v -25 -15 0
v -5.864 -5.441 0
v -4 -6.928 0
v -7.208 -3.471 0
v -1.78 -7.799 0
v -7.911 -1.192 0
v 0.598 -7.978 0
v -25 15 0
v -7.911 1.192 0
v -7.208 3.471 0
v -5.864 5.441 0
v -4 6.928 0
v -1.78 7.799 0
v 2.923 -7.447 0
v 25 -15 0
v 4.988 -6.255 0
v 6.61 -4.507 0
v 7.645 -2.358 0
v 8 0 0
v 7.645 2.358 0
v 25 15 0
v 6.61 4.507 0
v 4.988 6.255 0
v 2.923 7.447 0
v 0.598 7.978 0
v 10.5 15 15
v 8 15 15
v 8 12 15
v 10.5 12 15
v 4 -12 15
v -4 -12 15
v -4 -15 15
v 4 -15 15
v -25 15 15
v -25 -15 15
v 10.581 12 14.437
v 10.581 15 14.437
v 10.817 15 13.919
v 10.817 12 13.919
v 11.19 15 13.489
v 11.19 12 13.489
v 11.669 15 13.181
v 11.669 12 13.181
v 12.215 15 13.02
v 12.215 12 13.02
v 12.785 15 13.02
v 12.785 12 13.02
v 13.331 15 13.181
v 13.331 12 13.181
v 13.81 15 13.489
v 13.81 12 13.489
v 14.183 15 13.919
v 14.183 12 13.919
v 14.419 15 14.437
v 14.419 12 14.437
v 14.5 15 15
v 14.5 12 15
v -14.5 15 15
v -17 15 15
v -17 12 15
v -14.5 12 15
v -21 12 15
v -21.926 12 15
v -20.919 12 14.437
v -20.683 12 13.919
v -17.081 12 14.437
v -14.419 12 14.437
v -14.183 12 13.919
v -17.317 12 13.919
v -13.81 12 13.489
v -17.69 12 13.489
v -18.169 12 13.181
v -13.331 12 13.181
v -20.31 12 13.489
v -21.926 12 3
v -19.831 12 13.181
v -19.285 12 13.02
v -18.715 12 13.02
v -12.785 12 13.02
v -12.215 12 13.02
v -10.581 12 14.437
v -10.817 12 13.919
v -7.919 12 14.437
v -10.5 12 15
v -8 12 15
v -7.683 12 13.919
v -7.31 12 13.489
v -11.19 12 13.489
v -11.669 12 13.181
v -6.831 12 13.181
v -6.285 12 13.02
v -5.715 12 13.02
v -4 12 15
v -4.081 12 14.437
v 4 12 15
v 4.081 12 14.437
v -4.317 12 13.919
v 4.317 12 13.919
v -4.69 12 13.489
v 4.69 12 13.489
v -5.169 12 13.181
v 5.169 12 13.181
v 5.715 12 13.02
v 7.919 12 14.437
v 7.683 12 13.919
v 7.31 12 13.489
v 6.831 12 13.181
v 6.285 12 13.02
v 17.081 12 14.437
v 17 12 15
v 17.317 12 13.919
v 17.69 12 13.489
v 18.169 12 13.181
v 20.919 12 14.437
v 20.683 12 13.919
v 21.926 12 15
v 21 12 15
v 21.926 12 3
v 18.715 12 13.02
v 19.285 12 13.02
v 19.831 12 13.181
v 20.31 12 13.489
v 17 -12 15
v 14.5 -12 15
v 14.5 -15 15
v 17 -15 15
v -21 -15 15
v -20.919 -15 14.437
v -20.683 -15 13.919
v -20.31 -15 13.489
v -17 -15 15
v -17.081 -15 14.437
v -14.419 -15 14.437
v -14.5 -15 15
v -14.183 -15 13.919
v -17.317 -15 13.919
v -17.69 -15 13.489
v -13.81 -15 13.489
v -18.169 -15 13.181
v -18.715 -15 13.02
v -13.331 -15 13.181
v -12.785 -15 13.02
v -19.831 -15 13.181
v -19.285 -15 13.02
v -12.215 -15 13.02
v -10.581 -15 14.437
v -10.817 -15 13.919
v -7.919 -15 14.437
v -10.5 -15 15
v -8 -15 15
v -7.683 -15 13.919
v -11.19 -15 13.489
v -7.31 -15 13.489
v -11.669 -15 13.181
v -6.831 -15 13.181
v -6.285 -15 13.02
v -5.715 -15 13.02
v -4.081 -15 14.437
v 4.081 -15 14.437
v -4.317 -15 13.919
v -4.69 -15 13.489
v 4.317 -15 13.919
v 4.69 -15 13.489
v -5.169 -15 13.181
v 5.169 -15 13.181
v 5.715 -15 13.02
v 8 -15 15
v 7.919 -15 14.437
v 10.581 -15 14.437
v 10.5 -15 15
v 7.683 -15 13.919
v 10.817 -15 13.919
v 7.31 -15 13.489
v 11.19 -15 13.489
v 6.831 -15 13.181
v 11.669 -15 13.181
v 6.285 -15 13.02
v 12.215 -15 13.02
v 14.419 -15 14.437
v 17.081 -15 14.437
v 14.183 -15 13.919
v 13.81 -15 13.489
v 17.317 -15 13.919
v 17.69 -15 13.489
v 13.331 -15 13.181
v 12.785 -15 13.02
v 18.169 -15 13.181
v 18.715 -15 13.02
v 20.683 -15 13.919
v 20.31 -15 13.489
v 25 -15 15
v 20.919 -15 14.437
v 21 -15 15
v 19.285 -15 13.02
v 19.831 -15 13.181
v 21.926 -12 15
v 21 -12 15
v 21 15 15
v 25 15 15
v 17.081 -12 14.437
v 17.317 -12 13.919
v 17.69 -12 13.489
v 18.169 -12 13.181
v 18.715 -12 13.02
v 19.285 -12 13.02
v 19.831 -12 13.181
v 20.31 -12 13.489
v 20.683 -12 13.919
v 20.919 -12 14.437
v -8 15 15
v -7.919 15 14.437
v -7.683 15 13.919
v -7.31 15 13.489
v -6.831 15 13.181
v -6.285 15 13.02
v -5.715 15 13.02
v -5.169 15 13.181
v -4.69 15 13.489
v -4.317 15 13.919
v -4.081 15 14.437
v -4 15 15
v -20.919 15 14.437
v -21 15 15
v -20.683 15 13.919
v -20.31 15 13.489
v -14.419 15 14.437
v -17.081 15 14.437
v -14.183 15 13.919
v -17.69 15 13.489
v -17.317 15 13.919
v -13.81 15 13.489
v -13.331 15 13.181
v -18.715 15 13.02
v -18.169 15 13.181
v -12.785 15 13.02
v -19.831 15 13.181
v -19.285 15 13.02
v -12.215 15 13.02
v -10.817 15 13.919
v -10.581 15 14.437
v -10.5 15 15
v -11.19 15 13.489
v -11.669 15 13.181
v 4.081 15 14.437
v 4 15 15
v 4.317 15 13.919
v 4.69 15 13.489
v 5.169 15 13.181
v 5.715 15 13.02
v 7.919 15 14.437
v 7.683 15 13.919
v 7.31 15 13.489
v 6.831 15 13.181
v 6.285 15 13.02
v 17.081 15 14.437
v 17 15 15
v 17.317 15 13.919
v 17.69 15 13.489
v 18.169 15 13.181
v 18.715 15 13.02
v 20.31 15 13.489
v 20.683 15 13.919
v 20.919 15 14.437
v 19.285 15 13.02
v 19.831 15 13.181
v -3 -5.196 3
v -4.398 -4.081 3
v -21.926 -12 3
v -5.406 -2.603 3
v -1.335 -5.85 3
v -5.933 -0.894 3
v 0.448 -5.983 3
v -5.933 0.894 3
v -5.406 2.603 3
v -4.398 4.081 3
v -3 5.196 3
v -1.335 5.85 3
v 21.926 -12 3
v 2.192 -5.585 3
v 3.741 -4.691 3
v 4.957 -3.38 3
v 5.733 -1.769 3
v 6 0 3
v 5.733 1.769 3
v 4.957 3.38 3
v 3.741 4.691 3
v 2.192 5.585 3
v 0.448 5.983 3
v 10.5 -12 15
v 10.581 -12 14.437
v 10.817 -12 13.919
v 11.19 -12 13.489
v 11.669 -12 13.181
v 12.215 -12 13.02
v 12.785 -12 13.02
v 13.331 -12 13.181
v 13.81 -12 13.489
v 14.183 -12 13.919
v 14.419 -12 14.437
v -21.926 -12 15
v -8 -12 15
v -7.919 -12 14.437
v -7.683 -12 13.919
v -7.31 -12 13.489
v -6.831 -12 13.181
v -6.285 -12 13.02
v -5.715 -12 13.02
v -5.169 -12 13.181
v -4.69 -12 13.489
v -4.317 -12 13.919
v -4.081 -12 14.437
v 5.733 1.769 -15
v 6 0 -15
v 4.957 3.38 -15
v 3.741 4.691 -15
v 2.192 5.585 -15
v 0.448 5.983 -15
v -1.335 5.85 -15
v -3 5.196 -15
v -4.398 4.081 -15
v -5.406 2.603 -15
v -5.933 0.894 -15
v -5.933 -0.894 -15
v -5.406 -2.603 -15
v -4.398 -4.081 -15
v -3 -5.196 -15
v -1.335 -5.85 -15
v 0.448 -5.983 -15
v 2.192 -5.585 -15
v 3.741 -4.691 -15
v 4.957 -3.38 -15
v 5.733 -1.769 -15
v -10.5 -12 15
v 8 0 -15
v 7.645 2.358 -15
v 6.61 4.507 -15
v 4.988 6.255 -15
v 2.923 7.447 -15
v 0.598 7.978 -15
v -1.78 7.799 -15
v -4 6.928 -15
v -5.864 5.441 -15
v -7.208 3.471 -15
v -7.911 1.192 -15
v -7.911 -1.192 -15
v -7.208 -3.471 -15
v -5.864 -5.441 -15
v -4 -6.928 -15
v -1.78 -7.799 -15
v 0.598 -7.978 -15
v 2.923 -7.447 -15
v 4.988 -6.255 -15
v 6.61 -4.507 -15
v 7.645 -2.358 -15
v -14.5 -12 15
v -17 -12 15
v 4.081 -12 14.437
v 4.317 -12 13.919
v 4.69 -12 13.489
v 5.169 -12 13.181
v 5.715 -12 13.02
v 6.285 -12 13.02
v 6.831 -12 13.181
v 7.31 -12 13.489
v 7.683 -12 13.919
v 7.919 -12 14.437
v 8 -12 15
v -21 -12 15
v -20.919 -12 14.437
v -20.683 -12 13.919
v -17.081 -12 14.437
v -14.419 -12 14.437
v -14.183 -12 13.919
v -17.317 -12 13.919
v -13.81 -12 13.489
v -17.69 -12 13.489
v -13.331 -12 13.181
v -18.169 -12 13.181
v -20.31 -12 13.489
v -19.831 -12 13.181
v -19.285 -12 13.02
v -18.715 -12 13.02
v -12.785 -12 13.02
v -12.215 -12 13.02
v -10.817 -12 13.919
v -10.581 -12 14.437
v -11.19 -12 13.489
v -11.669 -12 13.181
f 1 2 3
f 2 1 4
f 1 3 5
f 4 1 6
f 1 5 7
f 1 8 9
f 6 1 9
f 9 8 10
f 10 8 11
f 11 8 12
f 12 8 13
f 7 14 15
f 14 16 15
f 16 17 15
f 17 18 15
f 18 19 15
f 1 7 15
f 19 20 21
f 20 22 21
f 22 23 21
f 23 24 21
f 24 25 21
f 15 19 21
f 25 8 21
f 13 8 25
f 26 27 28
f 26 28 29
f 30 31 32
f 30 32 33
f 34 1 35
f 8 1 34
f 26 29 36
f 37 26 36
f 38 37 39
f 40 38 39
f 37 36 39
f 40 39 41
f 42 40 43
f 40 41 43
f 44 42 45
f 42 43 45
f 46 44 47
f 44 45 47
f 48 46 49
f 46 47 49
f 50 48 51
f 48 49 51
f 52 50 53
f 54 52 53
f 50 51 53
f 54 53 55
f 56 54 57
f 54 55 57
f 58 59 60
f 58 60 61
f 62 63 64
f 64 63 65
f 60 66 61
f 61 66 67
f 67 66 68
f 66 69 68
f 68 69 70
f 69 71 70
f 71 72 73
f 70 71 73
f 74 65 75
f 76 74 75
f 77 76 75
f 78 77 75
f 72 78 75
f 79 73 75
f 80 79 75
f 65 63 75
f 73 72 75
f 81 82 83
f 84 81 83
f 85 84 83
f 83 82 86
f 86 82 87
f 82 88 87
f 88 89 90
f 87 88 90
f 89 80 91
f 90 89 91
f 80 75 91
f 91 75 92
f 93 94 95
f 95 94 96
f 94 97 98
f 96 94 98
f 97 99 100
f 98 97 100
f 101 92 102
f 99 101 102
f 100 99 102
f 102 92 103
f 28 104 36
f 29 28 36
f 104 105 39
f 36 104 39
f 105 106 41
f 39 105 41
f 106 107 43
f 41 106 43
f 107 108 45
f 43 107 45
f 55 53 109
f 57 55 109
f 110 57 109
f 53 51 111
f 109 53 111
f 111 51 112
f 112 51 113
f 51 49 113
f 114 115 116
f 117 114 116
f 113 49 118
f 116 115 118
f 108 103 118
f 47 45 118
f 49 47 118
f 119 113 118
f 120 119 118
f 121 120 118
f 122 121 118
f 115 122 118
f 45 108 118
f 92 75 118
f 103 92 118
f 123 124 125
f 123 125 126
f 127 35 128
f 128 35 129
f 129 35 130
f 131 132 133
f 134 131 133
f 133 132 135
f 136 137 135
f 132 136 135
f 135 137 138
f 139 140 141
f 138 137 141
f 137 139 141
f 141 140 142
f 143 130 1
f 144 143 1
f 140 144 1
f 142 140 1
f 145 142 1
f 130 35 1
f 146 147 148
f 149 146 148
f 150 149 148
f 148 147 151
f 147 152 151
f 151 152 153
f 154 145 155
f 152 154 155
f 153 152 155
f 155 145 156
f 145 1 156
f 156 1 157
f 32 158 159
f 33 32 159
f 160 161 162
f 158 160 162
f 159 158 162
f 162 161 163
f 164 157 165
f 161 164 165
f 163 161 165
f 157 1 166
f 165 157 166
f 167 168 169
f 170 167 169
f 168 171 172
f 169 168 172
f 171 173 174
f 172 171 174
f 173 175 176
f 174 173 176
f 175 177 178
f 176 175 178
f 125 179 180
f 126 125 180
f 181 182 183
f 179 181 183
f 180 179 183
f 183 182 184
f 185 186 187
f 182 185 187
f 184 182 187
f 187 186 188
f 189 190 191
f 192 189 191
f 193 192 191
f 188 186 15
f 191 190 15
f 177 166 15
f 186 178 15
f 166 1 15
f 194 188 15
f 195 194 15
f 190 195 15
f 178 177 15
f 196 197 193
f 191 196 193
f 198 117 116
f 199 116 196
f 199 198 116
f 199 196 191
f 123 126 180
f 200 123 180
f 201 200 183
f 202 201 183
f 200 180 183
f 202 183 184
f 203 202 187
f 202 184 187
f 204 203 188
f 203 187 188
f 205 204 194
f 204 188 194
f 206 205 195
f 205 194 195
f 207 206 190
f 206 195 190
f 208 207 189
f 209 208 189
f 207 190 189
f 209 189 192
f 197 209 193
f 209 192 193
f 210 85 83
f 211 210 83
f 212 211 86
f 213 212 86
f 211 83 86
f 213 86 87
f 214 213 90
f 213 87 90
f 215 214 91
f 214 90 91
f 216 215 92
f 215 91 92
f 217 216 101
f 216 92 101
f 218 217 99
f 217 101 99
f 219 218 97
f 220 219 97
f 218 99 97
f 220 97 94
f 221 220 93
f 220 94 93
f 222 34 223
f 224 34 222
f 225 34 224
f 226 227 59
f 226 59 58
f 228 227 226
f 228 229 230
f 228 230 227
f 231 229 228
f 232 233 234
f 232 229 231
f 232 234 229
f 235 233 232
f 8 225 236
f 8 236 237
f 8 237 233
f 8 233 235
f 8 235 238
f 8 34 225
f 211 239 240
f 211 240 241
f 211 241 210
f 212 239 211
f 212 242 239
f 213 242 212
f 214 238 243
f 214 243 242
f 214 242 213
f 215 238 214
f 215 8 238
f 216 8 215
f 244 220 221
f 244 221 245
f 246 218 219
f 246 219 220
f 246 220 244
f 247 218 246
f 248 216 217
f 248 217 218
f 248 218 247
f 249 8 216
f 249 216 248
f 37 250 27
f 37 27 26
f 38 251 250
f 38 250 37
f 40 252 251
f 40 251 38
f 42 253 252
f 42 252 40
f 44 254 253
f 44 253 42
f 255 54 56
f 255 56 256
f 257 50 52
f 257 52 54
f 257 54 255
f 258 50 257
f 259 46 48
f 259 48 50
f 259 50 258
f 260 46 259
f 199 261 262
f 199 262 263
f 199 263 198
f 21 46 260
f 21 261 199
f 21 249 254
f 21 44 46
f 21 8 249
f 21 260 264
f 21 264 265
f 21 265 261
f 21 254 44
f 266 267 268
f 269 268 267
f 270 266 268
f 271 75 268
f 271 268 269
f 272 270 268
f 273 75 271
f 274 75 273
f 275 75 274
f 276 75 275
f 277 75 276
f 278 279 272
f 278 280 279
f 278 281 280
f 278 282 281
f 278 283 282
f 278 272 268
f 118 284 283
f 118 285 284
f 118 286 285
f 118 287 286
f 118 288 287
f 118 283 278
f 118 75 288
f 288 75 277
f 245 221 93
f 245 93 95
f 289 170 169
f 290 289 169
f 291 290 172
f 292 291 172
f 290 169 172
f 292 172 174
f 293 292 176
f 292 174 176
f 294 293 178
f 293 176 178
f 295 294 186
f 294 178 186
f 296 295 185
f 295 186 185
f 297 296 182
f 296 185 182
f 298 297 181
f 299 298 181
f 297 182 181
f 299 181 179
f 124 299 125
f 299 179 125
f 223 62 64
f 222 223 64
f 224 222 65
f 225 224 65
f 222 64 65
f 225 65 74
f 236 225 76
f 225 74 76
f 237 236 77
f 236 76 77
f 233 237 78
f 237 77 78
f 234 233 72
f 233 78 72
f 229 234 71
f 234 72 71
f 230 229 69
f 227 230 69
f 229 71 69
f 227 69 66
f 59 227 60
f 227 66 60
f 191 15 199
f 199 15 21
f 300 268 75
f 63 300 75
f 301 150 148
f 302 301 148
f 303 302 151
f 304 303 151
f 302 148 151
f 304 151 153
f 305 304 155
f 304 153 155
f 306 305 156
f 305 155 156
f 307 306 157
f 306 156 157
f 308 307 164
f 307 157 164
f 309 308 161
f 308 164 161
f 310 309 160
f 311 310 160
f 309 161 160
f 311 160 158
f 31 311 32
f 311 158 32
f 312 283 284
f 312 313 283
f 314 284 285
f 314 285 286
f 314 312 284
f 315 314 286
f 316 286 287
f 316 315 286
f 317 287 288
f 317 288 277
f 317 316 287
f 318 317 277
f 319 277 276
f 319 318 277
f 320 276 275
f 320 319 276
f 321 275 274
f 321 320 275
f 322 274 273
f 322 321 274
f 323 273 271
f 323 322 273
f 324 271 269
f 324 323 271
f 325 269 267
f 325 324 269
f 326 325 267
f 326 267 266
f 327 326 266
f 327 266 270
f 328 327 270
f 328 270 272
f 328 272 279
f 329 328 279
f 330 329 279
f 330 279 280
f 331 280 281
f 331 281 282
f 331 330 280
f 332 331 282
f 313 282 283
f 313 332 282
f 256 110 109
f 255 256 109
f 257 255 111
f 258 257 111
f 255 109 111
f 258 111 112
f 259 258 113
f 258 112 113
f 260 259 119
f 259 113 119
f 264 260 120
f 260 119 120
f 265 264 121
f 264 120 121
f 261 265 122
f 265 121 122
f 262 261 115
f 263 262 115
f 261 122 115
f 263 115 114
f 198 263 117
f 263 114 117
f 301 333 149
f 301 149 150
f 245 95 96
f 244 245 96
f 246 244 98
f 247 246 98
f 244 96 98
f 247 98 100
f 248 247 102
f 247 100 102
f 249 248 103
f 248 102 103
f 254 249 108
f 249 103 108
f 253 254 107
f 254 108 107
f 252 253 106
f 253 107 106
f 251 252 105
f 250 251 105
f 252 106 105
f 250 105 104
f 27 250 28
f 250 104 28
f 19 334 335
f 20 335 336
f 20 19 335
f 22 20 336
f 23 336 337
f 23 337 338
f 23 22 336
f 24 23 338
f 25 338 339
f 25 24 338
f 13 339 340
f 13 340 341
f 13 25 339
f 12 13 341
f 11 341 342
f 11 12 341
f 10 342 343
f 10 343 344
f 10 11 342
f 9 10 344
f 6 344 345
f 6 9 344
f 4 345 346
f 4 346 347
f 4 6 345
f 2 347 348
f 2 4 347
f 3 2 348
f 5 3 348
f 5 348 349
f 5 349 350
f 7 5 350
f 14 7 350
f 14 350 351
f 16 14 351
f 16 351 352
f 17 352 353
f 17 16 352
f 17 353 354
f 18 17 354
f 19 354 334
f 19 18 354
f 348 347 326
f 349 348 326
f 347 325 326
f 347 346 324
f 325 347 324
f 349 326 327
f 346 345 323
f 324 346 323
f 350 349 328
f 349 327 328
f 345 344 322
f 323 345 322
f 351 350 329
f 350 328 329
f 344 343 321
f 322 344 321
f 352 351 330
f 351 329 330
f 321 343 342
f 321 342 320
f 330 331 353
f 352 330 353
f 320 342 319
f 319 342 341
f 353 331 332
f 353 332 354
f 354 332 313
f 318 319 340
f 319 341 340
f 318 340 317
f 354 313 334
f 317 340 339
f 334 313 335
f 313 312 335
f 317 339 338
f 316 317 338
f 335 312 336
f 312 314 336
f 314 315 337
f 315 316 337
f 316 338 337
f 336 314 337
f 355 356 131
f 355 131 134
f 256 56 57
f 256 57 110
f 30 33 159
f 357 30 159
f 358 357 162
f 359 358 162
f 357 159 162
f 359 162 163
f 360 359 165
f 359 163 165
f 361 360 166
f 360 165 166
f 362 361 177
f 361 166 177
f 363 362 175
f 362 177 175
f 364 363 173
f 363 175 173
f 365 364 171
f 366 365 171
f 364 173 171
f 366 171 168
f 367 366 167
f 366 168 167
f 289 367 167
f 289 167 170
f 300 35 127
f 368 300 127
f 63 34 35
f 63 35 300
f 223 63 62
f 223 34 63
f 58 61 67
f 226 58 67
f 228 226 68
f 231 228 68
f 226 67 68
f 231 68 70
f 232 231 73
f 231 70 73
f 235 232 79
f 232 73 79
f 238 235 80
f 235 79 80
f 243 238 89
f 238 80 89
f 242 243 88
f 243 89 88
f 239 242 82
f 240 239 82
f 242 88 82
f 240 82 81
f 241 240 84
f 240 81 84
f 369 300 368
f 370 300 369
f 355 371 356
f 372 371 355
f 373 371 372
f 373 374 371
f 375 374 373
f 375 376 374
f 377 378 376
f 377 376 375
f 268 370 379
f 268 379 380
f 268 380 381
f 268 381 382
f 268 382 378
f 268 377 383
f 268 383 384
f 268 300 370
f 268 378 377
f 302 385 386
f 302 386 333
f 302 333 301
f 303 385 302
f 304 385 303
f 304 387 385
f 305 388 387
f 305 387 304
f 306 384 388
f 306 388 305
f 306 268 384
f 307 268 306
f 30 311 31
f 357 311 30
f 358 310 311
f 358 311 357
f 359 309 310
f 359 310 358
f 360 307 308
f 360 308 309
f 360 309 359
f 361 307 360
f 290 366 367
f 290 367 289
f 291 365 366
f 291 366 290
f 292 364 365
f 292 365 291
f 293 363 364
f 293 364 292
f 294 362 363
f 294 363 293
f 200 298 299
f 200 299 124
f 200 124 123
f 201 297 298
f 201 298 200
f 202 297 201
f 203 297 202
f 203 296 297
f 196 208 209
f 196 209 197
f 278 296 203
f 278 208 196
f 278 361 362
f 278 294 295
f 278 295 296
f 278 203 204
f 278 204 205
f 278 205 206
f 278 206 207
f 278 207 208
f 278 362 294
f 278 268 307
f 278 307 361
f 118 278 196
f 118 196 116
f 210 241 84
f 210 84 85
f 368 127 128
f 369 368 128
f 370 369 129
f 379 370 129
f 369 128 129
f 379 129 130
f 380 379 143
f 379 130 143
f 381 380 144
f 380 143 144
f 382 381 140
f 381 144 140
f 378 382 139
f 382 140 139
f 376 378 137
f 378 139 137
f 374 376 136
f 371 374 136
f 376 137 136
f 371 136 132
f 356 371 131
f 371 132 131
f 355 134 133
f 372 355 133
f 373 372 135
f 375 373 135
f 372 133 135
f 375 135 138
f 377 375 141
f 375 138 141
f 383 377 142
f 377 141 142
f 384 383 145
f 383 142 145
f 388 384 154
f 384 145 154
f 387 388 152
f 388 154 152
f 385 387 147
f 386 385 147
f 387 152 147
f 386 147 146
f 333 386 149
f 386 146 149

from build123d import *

# Parameters (mm, degrees)
F0_W          = 50
F0_H          = 30
F0_W_2        = 43.8518549643
F0_H_2        = 24
F1_DEPTH      = 15
F0_R          = 8
F2_DEPTH      = 3
F0_R_2        = 6
F3_DEPTH      = 15
F3_DEPTH_BACK = 3
F5_DEPTH      = 46.6


with BuildPart() as f1:
    # F0 (on Top) → F1 (new body)
    with BuildSketch(Plane.XY):
        Rectangle(F0_W, F0_H)
        Rectangle(F0_W_2, F0_H_2, mode=Mode.SUBTRACT)
    extrude(amount=F1_DEPTH)

    # F0 (on Top) → F2 (join)
    with BuildSketch(Plane.XY):
        Rectangle(F0_W_2, F0_H_2)
        Circle(F0_R, mode=Mode.SUBTRACT)
    extrude(amount=F2_DEPTH)

    # F0 (on Top) → F3 (join, two sides)
    with BuildSketch(Plane.XY) as f3_sk:
        Circle(F0_R)
        Circle(F0_R_2, mode=Mode.SUBTRACT)
    extrude(amount=-F3_DEPTH)
    extrude(f3_sk.sketch, amount=F3_DEPTH_BACK)

    # F4 (on face) → F5 (cut)
    with BuildSketch(Plane.XZ.offset(15)):
        with BuildLine():
            ThreePointArc((-17, 15), (-19, 17), (-21, 15))
            Line((-21, 15), (-17, 15))
        make_face()
        with BuildLine():
            ThreePointArc((21, 15), (19, 17), (17, 15))
            Line((17, 15), (21, 15))
        make_face()
        with BuildLine():
            Line((21, 15), (17, 15))
            ThreePointArc((17, 15), (19, 13), (21, 15))
        make_face()
        with BuildLine():
            ThreePointArc((14.5, 15), (12.5, 17), (10.5, 15))
            Line((10.5, 15), (14.5, 15))
        make_face()
        with BuildLine():
            Line((14.5, 15), (10.5, 15))
            ThreePointArc((10.5, 15), (12.5, 13), (14.5, 15))
        make_face()
        with BuildLine():
            ThreePointArc((8, 15), (6, 17), (4, 15))
            Line((4, 15), (8, 15))
        make_face()
        with BuildLine():
            Line((8, 15), (4, 15))
            ThreePointArc((4, 15), (6, 13), (8, 15))
        make_face()
        with BuildLine():
            ThreePointArc((-4, 15), (-6, 17), (-8, 15))
            Line((-8, 15), (-4, 15))
        make_face()
        with BuildLine():
            Line((-4, 15), (-8, 15))
            ThreePointArc((-8, 15), (-6, 13), (-4, 15))
        make_face()
        with BuildLine():
            ThreePointArc((-10.5, 15), (-12.5, 17), (-14.5, 15))
            Line((-14.5, 15), (-10.5, 15))
        make_face()
        with BuildLine():
            Line((-10.5, 15), (-14.5, 15))
            ThreePointArc((-14.5, 15), (-12.5, 13), (-10.5, 15))
        make_face()
        with BuildLine():
            Line((-17, 15), (-21, 15))
            ThreePointArc((-21, 15), (-19, 13), (-17, 15))
        make_face()
    extrude(amount=-F5_DEPTH, mode=Mode.SUBTRACT)


solid = f1.part
